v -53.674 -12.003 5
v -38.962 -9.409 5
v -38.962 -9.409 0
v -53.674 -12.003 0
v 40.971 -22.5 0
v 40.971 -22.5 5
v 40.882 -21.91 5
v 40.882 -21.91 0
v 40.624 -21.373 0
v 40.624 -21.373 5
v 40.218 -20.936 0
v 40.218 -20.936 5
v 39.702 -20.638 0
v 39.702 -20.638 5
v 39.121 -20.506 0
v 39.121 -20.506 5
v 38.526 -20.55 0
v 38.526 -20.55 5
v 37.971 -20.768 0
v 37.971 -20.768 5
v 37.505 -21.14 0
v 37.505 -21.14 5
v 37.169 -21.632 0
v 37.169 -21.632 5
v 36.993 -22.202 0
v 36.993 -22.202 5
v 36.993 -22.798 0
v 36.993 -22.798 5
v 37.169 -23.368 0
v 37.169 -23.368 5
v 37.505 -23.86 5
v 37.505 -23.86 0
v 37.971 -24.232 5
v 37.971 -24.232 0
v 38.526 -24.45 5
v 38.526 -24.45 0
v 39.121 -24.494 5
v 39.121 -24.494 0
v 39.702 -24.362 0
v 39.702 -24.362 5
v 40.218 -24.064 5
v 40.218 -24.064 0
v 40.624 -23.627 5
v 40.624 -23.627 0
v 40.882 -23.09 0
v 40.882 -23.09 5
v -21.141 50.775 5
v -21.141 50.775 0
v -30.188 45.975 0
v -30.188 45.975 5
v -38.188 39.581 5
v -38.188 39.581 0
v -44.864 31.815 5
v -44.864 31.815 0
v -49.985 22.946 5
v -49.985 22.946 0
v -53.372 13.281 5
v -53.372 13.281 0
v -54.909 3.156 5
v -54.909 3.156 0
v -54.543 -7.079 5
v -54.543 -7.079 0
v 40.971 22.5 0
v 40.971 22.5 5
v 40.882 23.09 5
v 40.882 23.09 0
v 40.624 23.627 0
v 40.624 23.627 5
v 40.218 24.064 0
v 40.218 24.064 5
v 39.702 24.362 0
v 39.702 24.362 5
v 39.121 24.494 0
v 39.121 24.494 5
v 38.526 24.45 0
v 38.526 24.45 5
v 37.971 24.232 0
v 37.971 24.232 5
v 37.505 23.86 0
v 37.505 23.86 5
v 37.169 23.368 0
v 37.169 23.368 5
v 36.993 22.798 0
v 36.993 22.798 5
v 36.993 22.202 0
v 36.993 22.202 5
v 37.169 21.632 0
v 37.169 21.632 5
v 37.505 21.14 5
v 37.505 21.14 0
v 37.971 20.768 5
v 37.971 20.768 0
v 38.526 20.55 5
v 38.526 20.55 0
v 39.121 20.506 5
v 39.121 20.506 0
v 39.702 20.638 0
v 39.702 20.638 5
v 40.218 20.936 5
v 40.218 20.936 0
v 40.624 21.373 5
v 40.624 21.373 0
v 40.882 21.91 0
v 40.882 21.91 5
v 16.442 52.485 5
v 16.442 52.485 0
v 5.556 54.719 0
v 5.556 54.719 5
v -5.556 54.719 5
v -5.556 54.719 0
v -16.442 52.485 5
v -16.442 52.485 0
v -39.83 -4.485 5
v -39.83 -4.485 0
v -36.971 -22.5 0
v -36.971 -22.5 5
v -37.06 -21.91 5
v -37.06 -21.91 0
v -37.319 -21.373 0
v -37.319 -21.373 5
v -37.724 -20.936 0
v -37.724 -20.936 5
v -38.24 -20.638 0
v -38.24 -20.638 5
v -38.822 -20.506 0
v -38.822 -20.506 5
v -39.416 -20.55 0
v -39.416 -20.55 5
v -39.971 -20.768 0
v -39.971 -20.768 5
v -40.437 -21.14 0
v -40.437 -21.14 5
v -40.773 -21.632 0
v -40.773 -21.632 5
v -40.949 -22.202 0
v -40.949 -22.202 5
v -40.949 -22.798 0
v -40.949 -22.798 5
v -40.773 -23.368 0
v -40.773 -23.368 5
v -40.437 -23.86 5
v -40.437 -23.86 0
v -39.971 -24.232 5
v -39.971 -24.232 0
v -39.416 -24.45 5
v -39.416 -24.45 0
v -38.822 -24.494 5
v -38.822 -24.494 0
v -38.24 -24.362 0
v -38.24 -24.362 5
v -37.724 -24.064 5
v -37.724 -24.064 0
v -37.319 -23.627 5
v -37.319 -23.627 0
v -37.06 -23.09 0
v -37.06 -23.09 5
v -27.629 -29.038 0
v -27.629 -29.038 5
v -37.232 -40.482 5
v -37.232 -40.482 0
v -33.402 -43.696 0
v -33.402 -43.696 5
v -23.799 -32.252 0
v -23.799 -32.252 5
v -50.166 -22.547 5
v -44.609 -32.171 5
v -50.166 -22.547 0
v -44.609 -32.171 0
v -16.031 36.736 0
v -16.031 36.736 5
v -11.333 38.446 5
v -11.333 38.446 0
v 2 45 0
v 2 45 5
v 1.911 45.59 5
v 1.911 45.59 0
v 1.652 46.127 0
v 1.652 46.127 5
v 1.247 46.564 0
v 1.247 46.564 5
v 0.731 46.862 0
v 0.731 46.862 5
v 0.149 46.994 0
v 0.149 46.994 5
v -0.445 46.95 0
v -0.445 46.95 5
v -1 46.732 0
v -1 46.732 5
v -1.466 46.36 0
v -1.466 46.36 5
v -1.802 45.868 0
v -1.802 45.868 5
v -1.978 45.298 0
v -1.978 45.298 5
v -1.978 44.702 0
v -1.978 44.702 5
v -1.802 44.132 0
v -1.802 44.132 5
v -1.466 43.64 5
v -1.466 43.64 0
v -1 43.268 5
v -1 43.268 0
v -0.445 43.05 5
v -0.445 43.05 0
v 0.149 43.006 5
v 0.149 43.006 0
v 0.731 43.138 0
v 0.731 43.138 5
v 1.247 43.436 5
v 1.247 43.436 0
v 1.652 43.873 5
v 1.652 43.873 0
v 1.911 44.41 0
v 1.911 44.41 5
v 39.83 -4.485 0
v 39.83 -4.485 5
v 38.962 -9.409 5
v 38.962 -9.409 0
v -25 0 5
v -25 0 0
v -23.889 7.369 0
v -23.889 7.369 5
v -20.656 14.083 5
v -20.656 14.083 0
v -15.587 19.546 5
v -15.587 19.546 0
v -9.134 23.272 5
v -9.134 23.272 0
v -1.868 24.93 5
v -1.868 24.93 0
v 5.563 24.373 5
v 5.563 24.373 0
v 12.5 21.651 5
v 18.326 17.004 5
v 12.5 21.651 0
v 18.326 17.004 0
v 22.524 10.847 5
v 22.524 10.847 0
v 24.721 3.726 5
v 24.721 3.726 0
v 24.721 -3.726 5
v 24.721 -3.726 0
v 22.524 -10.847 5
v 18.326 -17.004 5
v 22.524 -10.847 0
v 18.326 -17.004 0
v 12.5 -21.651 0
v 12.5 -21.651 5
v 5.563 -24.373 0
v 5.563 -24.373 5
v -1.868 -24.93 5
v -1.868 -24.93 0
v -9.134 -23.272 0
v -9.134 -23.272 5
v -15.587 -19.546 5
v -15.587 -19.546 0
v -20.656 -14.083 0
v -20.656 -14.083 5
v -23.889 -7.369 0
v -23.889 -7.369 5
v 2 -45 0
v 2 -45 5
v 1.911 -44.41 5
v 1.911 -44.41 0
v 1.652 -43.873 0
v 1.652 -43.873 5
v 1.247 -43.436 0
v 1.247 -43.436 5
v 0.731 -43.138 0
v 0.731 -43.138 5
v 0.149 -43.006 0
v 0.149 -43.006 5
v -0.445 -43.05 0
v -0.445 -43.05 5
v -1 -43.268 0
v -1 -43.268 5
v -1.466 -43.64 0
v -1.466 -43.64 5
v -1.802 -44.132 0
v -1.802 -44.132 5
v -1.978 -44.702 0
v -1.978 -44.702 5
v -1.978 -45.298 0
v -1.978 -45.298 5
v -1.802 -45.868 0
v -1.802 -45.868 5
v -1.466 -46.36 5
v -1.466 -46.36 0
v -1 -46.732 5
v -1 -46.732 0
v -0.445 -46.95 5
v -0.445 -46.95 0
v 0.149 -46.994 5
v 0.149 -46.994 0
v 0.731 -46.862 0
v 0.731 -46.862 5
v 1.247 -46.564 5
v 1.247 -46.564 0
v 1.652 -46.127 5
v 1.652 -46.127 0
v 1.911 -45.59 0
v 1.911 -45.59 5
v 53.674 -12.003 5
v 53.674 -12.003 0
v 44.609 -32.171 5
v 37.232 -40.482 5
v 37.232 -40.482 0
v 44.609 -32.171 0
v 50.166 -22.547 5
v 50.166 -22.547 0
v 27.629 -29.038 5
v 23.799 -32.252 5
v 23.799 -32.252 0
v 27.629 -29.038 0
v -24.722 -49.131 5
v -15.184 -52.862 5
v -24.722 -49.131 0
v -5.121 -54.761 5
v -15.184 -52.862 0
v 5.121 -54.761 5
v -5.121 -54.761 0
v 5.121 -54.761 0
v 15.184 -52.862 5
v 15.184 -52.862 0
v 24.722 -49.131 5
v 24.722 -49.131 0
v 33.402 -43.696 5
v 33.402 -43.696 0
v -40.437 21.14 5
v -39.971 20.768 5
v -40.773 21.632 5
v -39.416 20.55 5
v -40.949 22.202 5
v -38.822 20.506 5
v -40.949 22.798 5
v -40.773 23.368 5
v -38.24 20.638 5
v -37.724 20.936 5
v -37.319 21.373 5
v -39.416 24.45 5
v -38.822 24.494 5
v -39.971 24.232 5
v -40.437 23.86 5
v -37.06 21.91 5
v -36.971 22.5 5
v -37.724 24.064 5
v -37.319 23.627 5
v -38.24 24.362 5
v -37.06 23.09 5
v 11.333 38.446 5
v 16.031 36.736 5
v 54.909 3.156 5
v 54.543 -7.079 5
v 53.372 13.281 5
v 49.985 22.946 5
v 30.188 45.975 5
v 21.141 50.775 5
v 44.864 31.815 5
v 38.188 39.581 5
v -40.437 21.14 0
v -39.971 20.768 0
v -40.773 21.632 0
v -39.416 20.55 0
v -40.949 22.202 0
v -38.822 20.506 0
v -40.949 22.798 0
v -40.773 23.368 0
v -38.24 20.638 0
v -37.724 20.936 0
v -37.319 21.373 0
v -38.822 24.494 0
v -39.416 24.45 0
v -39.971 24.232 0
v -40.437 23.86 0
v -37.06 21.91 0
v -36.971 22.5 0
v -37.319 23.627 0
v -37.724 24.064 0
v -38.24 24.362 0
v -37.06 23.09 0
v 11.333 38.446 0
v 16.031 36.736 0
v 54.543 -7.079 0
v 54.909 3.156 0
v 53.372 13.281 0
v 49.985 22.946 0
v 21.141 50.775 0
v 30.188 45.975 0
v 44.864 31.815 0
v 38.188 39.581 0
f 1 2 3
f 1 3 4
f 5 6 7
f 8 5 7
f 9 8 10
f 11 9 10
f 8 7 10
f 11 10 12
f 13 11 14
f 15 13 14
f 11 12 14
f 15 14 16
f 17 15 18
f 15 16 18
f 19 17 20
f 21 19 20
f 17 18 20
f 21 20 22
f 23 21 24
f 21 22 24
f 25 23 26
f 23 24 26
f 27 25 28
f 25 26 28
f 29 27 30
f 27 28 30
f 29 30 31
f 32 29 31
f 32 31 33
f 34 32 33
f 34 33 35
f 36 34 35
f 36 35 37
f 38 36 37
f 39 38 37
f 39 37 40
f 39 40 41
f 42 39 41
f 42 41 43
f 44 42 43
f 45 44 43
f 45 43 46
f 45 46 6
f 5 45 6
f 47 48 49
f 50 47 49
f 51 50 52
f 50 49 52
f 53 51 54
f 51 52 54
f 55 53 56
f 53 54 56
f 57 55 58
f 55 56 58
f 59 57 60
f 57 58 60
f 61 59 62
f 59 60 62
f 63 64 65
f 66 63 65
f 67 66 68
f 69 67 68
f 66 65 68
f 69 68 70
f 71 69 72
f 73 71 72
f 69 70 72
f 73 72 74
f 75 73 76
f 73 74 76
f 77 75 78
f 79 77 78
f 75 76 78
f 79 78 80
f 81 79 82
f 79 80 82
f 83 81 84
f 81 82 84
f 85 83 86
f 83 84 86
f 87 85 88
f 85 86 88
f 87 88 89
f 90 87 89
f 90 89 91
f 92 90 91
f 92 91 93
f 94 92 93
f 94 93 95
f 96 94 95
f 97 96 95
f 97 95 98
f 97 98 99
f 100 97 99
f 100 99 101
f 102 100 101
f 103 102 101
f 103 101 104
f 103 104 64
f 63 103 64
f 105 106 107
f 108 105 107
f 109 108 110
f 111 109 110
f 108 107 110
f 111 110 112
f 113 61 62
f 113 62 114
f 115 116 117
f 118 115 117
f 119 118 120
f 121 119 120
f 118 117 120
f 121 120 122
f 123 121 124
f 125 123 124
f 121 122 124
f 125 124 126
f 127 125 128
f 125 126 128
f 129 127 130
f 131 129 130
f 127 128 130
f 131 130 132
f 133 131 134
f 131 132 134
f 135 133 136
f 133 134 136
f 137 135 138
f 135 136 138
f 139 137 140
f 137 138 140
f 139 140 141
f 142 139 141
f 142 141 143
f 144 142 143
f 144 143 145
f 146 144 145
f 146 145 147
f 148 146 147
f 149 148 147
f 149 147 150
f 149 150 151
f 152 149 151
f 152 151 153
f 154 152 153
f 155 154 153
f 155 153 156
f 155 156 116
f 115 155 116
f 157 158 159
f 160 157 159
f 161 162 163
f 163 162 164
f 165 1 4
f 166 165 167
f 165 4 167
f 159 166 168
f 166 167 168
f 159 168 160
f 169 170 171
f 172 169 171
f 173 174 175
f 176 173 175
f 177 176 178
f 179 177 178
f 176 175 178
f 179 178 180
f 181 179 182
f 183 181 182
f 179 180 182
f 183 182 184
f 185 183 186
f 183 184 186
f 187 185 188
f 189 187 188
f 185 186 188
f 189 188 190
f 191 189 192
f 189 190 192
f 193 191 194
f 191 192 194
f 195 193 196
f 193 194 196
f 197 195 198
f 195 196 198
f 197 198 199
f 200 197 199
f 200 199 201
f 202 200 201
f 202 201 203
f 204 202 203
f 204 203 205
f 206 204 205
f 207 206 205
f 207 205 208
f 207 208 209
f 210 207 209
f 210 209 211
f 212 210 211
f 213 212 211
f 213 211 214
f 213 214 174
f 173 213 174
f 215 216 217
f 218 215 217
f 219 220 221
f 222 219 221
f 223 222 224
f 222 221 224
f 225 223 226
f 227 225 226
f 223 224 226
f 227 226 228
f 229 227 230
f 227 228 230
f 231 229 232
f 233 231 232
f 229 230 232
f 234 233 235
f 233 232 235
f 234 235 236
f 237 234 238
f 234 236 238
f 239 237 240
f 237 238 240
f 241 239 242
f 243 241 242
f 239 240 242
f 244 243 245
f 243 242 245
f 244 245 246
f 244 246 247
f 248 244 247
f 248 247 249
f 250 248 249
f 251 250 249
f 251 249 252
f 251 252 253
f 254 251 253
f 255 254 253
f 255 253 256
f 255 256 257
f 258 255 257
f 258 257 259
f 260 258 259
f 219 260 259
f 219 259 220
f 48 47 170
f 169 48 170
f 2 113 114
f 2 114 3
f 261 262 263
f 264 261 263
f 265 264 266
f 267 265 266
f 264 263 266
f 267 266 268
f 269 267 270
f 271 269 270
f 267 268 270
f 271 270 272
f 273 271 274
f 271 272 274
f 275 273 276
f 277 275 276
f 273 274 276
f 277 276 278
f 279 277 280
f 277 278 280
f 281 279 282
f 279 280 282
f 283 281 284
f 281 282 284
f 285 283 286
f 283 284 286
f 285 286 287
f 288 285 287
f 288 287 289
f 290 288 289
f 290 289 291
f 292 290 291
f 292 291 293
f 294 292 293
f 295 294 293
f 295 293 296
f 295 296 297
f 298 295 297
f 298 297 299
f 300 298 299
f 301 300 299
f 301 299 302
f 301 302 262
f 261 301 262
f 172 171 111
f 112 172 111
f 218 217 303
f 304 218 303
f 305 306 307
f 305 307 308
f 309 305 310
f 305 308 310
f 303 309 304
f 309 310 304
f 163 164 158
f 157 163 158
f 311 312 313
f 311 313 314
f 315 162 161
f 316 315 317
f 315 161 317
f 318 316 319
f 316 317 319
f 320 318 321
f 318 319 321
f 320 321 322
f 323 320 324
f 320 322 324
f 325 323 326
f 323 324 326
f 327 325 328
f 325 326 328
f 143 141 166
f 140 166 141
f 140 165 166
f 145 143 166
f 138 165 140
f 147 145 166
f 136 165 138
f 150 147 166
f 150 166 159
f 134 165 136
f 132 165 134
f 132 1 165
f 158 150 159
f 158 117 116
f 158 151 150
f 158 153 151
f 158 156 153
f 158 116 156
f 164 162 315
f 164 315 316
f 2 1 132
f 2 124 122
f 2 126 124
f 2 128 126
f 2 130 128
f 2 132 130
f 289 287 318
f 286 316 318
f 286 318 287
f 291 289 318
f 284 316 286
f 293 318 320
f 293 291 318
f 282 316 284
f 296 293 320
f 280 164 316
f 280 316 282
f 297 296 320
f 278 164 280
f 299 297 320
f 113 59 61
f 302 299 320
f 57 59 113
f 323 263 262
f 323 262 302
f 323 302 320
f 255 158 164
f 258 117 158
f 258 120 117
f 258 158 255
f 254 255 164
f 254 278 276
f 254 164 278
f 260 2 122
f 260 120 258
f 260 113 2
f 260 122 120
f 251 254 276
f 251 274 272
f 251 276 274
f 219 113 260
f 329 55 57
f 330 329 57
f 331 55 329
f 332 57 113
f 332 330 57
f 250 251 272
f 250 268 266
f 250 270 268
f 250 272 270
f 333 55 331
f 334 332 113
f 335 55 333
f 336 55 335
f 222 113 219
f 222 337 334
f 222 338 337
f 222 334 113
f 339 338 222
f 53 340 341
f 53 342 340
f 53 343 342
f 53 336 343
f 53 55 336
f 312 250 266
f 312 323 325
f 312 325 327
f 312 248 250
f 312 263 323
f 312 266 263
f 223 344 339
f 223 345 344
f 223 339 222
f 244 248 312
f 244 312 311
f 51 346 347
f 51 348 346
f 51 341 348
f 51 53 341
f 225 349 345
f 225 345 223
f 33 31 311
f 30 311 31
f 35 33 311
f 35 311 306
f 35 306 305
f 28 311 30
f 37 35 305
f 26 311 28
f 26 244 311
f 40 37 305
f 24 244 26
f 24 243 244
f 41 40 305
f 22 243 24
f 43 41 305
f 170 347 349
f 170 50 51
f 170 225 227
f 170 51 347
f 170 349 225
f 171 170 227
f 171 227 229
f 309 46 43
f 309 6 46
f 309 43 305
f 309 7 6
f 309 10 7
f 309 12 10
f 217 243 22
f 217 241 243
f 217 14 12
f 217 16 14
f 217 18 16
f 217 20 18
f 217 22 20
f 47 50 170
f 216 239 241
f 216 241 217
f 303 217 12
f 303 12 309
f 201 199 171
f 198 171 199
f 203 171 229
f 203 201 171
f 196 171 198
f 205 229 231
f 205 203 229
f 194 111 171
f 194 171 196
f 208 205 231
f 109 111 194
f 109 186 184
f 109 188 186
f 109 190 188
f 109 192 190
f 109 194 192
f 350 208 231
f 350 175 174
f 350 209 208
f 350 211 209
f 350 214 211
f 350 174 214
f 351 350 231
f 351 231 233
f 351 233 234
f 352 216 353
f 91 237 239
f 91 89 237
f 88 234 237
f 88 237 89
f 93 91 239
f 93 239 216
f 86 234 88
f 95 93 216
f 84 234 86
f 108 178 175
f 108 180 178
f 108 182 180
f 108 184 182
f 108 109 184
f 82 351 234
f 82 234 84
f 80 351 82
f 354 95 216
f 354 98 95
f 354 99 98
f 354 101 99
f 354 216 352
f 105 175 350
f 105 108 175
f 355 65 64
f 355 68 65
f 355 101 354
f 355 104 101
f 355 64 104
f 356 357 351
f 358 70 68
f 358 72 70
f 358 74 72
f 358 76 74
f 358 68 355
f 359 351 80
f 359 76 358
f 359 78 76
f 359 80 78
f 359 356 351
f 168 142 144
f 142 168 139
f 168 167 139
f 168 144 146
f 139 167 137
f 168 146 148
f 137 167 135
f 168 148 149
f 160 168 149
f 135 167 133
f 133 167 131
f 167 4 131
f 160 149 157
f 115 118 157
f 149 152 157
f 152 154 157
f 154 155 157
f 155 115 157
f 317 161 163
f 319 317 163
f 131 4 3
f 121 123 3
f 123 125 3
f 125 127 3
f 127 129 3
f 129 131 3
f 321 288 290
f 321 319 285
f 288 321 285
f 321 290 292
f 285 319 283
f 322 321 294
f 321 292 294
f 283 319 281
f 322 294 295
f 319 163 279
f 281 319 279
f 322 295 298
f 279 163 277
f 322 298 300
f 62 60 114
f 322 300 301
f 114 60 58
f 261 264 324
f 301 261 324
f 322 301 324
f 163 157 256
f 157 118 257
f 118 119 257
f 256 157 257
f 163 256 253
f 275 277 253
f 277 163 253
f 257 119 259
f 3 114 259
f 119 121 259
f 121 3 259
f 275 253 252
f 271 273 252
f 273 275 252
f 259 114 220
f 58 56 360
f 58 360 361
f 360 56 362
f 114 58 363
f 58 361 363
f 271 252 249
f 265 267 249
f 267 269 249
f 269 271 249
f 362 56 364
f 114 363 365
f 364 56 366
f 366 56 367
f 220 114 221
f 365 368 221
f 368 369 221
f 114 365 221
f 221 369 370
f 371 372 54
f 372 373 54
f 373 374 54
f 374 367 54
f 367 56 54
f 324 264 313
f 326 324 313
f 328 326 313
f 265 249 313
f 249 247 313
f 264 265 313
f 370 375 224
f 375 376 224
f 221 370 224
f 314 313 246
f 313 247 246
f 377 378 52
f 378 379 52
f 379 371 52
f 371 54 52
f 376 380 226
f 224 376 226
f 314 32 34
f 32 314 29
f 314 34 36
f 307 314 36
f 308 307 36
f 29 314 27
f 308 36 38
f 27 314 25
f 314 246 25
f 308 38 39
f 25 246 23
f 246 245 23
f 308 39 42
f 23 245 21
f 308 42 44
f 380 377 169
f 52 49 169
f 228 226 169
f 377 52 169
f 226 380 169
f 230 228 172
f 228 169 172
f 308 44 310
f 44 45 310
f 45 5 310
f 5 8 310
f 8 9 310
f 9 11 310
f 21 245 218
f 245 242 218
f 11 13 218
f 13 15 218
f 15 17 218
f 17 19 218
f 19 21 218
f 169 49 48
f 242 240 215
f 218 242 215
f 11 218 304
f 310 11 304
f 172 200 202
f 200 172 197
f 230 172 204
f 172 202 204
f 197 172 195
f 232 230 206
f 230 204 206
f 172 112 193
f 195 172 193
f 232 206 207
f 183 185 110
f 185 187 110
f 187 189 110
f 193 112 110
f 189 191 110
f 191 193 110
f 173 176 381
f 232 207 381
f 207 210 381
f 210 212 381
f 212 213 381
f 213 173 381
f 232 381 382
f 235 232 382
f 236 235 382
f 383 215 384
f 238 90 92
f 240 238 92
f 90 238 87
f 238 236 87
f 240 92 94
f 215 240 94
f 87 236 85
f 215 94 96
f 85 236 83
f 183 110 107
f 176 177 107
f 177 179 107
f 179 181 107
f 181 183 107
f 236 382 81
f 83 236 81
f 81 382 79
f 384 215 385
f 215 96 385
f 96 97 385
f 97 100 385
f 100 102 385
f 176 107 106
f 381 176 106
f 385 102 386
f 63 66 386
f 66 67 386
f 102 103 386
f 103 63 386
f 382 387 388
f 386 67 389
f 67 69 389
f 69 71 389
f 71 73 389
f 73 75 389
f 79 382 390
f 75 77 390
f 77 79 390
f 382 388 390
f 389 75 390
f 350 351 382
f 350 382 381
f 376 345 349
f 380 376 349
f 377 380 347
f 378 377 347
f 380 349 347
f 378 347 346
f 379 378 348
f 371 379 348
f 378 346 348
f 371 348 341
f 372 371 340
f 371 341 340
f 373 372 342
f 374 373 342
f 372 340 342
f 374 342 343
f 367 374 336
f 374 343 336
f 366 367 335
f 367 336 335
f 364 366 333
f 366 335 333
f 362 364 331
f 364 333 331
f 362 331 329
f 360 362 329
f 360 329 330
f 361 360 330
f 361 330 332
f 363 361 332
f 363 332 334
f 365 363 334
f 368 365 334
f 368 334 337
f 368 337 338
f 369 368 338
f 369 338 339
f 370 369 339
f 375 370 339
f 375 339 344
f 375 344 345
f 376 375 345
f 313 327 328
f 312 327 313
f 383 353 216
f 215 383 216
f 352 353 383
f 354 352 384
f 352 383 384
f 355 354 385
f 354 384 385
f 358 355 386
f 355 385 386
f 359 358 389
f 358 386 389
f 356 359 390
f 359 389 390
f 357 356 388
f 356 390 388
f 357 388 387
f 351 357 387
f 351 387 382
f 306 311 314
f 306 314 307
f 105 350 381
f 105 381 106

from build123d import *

# Parameters (mm, degrees)
CROQUIS1_R              = 55
SALIENTE_EXTRUIR1_DEPTH = 5
CORTAR_EXTRUIR1_DEPTH   = 78.942286341
CROQUIS3_R              = 2
CORTAR_EXTRUIR2_DEPTH   = 10
CROQUIS4_R              = 25
CORTAR_EXTRUIR3_DEPTH   = 78.942286341


with BuildPart() as part:
    # Croquis1 → Saliente-Extruir1 (new body)
    with BuildSketch(Plane.XY):
        Circle(CROQUIS1_R)
    extrude(amount=SALIENTE_EXTRUIR1_DEPTH)

    # Croquis2 → Cortar-Extruir1 (cut, through all)
    with BuildSketch(Plane.XY.offset(5)):
        Polygon((-21.161601507, 50.8315113), (-16.031299357, 36.736121988), (-11.332836253, 38.446222705), (-16.463138403, 52.541612016), align=None)
        Polygon((16.031299357, 36.736121988), (11.332836253, 38.446222705), (16.463138403, 52.541612016), (21.161601507, 50.8315113), align=None)
        Polygon((54.602180852, -7.08927116), (39.830064557, -4.484548495), (38.961823668, -9.40858726), (53.733939964, -12.013309925), align=None)
        Polygon((27.628987415, -29.037635445), (37.27080156, -40.528302091), (33.440579345, -43.74224014), (23.7987652, -32.251573493), align=None)
        Polygon((-33.440579345, -43.74224014), (-23.7987652, -32.251573493), (-27.628987415, -29.037635445), (-37.27080156, -40.528302091), align=None)
        Polygon((-38.961823668, -9.40858726), (-53.733939964, -12.013309925), (-54.602180852, -7.08927116), (-39.830064557, -4.484548495), align=None)
    extrude(amount=-CORTAR_EXTRUIR1_DEPTH, mode=Mode.SUBTRACT)

    # Croquis3 → Cortar-Extruir2 (cut)
    with BuildSketch(Plane.XY.offset(5)):
        with Locations((0, 45)):
            Circle(CROQUIS3_R)
        with Locations((0, -45)):
            Circle(CROQUIS3_R)
        with Locations((38.97114317, -22.5)):
            Circle(CROQUIS3_R)
        with Locations((-38.97114317, 22.5)):
            Circle(CROQUIS3_R)
        with Locations((-38.97114317, -22.5)):
            Circle(CROQUIS3_R)
        with Locations((38.97114317, 22.5)):
            Circle(CROQUIS3_R)
    extrude(amount=-CORTAR_EXTRUIR2_DEPTH, mode=Mode.SUBTRACT)

    # Croquis4 → Cortar-Extruir3 (cut, through all)
    with BuildSketch(Plane(origin=(0, 0, 0), x_dir=(-1, 0, 0), z_dir=(0, 0, -1))):
        Circle(CROQUIS4_R)
    extrude(amount=-CORTAR_EXTRUIR3_DEPTH, mode=Mode.SUBTRACT)


solid = part.part
